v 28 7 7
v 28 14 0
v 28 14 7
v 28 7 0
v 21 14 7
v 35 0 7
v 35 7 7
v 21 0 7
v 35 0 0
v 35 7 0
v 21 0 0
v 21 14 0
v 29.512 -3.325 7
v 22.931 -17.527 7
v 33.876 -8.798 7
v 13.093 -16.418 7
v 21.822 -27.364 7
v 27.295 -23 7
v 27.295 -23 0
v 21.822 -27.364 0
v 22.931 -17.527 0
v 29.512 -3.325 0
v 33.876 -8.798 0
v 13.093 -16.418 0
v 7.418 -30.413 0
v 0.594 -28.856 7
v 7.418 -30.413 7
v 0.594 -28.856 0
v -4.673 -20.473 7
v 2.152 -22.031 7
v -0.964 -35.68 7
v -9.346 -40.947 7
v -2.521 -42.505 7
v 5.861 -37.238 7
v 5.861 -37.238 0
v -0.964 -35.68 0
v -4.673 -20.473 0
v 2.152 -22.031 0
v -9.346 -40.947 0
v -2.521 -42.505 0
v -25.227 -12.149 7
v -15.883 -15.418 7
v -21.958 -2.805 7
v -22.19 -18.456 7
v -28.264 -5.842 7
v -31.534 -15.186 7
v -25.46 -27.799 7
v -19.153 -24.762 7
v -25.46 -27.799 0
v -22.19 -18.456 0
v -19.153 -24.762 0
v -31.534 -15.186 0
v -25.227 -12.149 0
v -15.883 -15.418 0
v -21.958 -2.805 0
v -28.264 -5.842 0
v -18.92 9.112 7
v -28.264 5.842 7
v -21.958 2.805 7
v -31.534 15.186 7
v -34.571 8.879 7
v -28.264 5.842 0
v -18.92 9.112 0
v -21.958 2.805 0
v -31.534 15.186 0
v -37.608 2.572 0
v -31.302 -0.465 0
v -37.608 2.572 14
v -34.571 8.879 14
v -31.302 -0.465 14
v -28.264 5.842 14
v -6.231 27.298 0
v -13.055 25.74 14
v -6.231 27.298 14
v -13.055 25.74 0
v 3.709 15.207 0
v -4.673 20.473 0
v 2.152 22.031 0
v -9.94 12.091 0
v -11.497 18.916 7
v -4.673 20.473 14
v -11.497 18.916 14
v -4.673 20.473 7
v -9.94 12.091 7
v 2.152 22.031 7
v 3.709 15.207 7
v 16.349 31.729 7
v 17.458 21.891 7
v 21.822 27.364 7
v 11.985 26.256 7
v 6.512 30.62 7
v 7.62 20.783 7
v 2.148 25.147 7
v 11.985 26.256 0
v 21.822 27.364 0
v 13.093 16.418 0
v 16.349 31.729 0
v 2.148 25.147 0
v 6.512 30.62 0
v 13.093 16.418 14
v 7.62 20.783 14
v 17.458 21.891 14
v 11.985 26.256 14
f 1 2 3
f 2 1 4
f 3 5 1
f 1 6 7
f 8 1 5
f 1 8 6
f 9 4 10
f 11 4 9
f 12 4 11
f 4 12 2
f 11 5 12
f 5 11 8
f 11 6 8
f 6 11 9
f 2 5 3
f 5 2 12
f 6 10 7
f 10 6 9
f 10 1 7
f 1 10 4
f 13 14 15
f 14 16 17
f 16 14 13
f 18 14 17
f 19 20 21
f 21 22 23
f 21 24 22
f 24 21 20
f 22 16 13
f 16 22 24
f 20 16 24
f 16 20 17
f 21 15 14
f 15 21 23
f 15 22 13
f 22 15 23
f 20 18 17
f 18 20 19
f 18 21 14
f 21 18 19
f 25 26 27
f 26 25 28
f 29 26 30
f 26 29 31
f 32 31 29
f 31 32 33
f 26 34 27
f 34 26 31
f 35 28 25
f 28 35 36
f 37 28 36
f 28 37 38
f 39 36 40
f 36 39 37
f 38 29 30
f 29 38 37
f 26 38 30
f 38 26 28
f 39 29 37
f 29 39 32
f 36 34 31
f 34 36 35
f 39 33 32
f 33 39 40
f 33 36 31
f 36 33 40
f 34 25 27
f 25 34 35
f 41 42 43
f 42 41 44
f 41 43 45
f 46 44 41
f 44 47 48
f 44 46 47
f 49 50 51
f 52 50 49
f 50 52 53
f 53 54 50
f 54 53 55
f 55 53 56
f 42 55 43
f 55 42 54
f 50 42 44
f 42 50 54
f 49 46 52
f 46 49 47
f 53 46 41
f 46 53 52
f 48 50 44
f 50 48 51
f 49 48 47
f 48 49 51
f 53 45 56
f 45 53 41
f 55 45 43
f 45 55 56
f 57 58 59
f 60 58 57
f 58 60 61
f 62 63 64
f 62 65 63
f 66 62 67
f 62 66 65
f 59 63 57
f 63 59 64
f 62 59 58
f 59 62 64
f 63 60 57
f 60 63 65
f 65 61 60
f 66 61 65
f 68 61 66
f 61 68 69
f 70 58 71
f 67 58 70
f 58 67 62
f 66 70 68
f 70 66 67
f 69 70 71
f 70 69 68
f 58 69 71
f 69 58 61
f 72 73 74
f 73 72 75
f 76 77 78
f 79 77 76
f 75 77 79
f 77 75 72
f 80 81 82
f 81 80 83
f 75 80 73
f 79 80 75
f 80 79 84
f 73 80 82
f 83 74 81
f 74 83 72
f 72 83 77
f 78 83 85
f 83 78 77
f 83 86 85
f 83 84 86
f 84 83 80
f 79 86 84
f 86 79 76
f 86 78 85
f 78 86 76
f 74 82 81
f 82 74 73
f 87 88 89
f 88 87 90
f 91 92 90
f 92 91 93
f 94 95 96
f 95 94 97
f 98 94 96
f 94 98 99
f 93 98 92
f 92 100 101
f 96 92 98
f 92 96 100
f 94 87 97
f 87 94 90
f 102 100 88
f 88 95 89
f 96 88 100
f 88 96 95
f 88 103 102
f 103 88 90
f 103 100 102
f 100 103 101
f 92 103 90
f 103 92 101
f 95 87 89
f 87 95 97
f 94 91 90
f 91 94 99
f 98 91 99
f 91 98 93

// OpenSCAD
// remix by foofoodog of thing 96411
// http://en.wikipedia.org/wiki/Soma_cube
/* [Options] */
// of a single cube
size = 7;
cubes = [
	[[0,0,0],[0,1,0],[1,0,0]], // V
	[[0,0,0],[0,1,0],[0,2,0],[1,0,0]], // L
	[[0,0,0],[1,0,0],[2,0,0],[1,1,0]], // T
	[[0,0,0],[1,0,0],[1,1,0],[0,-1,0]], // Z
	[[0,0,0],[1,0,0],[1,1,0], [1,1,1]], // A
	[[0,0,0],[-1,-1,0],[0,0,1],[-1,0,0]], // B
	[[0,0,0],[0,0,1],[1,0,0],[0,1,0]] // P
];
// cheesy spacing calcs, start at x go clockwise
function slice() = -360/len(cubes);
function space() = size*3;
for(i=[0:len(cubes)-1]) { // one off does not even matter here, go figure
	rotate([0,0,slice() * i])
		translate([space(),0,0]) 
			part(cubes[i]);
}
module part(cubes) {
	for (i=cubes) {
		translate(i * size) cube(size);
	}
}
